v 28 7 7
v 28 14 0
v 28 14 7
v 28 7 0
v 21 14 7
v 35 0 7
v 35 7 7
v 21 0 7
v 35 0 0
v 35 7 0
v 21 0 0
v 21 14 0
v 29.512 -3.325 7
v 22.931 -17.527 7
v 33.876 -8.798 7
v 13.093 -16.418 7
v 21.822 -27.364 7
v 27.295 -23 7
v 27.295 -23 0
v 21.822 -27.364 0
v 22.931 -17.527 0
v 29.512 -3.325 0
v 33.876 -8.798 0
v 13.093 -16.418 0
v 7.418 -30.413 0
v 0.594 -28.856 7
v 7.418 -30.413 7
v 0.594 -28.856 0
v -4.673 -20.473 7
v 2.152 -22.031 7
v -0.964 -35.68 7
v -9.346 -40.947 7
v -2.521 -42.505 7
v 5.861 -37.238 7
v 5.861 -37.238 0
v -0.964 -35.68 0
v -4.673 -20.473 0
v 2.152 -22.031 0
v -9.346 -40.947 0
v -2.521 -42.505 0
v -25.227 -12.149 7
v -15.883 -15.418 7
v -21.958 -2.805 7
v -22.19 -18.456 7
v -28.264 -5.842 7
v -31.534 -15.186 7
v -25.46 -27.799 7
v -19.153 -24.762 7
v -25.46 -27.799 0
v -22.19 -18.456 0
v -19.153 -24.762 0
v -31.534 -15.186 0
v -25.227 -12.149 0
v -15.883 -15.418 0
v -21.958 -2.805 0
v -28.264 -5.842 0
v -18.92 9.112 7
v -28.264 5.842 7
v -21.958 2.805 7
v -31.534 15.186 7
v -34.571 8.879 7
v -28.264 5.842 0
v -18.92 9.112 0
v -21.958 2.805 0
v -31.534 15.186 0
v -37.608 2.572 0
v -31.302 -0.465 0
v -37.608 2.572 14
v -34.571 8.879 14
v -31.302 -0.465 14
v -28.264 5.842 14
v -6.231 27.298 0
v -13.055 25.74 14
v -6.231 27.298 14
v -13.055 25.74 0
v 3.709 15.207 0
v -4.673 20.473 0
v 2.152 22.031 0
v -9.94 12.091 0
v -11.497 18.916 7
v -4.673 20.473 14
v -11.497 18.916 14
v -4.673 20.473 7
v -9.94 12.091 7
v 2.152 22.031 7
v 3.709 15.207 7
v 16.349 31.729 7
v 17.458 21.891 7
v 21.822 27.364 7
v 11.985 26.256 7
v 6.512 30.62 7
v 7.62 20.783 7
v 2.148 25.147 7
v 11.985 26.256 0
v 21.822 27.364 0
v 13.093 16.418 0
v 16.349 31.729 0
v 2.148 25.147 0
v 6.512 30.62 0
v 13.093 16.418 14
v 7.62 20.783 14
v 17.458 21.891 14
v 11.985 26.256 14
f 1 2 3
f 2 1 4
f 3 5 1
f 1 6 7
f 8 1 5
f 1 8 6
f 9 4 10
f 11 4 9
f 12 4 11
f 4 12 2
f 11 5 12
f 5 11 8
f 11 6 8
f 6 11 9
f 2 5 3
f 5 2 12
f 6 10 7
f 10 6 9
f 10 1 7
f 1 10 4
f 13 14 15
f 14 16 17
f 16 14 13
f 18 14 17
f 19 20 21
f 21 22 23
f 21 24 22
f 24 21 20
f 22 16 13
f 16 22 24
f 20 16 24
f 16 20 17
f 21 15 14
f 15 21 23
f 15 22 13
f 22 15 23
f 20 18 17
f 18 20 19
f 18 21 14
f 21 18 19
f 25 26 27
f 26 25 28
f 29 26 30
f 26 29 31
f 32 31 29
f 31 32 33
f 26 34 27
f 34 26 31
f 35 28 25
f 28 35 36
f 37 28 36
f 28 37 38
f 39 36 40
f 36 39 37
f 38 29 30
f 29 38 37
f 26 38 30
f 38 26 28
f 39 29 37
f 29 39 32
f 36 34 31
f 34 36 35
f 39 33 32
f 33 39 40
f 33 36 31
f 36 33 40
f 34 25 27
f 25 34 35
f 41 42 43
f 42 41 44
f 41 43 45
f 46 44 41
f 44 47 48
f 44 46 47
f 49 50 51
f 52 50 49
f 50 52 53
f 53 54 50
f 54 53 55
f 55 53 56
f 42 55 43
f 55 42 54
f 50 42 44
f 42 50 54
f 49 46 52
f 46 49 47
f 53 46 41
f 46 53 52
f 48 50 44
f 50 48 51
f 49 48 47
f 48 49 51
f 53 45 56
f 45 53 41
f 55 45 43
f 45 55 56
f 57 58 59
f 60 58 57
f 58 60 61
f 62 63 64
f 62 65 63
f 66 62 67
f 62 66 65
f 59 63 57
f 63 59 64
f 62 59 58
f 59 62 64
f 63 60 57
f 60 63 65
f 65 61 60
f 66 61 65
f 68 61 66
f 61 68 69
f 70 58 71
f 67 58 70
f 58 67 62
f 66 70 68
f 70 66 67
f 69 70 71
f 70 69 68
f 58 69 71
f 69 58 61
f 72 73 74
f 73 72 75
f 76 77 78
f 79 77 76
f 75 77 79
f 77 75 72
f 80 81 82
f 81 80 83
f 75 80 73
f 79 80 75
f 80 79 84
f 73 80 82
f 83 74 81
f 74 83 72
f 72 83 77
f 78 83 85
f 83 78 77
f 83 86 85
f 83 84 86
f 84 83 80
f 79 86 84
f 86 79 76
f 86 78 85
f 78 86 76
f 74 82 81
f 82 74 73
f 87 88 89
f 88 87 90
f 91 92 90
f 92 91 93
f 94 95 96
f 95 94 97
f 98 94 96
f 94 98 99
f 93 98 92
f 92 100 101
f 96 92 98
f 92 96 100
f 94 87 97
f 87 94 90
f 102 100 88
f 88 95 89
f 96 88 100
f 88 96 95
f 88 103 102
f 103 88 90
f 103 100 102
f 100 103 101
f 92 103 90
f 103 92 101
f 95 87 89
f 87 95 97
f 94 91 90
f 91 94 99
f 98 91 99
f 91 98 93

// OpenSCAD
// remix by foofoodog of thing 96411
// http://en.wikipedia.org/wiki/Soma_cube
/* [Options] */
// of a single cube
size = 7;
cubes = [
	[[0,0,0],[0,1,0],[1,0,0]], // V
	[[0,0,0],[0,1,0],[0,2,0],[1,0,0]], // L
	[[0,0,0],[1,0,0],[2,0,0],[1,1,0]], // T
	[[0,0,0],[1,0,0],[1,1,0],[0,-1,0]], // Z
	[[0,0,0],[1,0,0],[1,1,0], [1,1,1]], // A
	[[0,0,0],[-1,-1,0],[0,0,1],[-1,0,0]], // B
	[[0,0,0],[0,0,1],[1,0,0],[0,1,0]] // P
];
// cheesy spacing calcs, start at x go clockwise
function slice() = -360/len(cubes);
function space() = size*3;
for(i=[0:len(cubes)-1]) { // one off does not even matter here, go figure
	rotate([0,0,slice() * i])
		translate([space(),0,0]) 
			part(cubes[i]);
}
module part(cubes) {
	for (i=cubes) {
		translate(i * size) cube(size);
	}
}
